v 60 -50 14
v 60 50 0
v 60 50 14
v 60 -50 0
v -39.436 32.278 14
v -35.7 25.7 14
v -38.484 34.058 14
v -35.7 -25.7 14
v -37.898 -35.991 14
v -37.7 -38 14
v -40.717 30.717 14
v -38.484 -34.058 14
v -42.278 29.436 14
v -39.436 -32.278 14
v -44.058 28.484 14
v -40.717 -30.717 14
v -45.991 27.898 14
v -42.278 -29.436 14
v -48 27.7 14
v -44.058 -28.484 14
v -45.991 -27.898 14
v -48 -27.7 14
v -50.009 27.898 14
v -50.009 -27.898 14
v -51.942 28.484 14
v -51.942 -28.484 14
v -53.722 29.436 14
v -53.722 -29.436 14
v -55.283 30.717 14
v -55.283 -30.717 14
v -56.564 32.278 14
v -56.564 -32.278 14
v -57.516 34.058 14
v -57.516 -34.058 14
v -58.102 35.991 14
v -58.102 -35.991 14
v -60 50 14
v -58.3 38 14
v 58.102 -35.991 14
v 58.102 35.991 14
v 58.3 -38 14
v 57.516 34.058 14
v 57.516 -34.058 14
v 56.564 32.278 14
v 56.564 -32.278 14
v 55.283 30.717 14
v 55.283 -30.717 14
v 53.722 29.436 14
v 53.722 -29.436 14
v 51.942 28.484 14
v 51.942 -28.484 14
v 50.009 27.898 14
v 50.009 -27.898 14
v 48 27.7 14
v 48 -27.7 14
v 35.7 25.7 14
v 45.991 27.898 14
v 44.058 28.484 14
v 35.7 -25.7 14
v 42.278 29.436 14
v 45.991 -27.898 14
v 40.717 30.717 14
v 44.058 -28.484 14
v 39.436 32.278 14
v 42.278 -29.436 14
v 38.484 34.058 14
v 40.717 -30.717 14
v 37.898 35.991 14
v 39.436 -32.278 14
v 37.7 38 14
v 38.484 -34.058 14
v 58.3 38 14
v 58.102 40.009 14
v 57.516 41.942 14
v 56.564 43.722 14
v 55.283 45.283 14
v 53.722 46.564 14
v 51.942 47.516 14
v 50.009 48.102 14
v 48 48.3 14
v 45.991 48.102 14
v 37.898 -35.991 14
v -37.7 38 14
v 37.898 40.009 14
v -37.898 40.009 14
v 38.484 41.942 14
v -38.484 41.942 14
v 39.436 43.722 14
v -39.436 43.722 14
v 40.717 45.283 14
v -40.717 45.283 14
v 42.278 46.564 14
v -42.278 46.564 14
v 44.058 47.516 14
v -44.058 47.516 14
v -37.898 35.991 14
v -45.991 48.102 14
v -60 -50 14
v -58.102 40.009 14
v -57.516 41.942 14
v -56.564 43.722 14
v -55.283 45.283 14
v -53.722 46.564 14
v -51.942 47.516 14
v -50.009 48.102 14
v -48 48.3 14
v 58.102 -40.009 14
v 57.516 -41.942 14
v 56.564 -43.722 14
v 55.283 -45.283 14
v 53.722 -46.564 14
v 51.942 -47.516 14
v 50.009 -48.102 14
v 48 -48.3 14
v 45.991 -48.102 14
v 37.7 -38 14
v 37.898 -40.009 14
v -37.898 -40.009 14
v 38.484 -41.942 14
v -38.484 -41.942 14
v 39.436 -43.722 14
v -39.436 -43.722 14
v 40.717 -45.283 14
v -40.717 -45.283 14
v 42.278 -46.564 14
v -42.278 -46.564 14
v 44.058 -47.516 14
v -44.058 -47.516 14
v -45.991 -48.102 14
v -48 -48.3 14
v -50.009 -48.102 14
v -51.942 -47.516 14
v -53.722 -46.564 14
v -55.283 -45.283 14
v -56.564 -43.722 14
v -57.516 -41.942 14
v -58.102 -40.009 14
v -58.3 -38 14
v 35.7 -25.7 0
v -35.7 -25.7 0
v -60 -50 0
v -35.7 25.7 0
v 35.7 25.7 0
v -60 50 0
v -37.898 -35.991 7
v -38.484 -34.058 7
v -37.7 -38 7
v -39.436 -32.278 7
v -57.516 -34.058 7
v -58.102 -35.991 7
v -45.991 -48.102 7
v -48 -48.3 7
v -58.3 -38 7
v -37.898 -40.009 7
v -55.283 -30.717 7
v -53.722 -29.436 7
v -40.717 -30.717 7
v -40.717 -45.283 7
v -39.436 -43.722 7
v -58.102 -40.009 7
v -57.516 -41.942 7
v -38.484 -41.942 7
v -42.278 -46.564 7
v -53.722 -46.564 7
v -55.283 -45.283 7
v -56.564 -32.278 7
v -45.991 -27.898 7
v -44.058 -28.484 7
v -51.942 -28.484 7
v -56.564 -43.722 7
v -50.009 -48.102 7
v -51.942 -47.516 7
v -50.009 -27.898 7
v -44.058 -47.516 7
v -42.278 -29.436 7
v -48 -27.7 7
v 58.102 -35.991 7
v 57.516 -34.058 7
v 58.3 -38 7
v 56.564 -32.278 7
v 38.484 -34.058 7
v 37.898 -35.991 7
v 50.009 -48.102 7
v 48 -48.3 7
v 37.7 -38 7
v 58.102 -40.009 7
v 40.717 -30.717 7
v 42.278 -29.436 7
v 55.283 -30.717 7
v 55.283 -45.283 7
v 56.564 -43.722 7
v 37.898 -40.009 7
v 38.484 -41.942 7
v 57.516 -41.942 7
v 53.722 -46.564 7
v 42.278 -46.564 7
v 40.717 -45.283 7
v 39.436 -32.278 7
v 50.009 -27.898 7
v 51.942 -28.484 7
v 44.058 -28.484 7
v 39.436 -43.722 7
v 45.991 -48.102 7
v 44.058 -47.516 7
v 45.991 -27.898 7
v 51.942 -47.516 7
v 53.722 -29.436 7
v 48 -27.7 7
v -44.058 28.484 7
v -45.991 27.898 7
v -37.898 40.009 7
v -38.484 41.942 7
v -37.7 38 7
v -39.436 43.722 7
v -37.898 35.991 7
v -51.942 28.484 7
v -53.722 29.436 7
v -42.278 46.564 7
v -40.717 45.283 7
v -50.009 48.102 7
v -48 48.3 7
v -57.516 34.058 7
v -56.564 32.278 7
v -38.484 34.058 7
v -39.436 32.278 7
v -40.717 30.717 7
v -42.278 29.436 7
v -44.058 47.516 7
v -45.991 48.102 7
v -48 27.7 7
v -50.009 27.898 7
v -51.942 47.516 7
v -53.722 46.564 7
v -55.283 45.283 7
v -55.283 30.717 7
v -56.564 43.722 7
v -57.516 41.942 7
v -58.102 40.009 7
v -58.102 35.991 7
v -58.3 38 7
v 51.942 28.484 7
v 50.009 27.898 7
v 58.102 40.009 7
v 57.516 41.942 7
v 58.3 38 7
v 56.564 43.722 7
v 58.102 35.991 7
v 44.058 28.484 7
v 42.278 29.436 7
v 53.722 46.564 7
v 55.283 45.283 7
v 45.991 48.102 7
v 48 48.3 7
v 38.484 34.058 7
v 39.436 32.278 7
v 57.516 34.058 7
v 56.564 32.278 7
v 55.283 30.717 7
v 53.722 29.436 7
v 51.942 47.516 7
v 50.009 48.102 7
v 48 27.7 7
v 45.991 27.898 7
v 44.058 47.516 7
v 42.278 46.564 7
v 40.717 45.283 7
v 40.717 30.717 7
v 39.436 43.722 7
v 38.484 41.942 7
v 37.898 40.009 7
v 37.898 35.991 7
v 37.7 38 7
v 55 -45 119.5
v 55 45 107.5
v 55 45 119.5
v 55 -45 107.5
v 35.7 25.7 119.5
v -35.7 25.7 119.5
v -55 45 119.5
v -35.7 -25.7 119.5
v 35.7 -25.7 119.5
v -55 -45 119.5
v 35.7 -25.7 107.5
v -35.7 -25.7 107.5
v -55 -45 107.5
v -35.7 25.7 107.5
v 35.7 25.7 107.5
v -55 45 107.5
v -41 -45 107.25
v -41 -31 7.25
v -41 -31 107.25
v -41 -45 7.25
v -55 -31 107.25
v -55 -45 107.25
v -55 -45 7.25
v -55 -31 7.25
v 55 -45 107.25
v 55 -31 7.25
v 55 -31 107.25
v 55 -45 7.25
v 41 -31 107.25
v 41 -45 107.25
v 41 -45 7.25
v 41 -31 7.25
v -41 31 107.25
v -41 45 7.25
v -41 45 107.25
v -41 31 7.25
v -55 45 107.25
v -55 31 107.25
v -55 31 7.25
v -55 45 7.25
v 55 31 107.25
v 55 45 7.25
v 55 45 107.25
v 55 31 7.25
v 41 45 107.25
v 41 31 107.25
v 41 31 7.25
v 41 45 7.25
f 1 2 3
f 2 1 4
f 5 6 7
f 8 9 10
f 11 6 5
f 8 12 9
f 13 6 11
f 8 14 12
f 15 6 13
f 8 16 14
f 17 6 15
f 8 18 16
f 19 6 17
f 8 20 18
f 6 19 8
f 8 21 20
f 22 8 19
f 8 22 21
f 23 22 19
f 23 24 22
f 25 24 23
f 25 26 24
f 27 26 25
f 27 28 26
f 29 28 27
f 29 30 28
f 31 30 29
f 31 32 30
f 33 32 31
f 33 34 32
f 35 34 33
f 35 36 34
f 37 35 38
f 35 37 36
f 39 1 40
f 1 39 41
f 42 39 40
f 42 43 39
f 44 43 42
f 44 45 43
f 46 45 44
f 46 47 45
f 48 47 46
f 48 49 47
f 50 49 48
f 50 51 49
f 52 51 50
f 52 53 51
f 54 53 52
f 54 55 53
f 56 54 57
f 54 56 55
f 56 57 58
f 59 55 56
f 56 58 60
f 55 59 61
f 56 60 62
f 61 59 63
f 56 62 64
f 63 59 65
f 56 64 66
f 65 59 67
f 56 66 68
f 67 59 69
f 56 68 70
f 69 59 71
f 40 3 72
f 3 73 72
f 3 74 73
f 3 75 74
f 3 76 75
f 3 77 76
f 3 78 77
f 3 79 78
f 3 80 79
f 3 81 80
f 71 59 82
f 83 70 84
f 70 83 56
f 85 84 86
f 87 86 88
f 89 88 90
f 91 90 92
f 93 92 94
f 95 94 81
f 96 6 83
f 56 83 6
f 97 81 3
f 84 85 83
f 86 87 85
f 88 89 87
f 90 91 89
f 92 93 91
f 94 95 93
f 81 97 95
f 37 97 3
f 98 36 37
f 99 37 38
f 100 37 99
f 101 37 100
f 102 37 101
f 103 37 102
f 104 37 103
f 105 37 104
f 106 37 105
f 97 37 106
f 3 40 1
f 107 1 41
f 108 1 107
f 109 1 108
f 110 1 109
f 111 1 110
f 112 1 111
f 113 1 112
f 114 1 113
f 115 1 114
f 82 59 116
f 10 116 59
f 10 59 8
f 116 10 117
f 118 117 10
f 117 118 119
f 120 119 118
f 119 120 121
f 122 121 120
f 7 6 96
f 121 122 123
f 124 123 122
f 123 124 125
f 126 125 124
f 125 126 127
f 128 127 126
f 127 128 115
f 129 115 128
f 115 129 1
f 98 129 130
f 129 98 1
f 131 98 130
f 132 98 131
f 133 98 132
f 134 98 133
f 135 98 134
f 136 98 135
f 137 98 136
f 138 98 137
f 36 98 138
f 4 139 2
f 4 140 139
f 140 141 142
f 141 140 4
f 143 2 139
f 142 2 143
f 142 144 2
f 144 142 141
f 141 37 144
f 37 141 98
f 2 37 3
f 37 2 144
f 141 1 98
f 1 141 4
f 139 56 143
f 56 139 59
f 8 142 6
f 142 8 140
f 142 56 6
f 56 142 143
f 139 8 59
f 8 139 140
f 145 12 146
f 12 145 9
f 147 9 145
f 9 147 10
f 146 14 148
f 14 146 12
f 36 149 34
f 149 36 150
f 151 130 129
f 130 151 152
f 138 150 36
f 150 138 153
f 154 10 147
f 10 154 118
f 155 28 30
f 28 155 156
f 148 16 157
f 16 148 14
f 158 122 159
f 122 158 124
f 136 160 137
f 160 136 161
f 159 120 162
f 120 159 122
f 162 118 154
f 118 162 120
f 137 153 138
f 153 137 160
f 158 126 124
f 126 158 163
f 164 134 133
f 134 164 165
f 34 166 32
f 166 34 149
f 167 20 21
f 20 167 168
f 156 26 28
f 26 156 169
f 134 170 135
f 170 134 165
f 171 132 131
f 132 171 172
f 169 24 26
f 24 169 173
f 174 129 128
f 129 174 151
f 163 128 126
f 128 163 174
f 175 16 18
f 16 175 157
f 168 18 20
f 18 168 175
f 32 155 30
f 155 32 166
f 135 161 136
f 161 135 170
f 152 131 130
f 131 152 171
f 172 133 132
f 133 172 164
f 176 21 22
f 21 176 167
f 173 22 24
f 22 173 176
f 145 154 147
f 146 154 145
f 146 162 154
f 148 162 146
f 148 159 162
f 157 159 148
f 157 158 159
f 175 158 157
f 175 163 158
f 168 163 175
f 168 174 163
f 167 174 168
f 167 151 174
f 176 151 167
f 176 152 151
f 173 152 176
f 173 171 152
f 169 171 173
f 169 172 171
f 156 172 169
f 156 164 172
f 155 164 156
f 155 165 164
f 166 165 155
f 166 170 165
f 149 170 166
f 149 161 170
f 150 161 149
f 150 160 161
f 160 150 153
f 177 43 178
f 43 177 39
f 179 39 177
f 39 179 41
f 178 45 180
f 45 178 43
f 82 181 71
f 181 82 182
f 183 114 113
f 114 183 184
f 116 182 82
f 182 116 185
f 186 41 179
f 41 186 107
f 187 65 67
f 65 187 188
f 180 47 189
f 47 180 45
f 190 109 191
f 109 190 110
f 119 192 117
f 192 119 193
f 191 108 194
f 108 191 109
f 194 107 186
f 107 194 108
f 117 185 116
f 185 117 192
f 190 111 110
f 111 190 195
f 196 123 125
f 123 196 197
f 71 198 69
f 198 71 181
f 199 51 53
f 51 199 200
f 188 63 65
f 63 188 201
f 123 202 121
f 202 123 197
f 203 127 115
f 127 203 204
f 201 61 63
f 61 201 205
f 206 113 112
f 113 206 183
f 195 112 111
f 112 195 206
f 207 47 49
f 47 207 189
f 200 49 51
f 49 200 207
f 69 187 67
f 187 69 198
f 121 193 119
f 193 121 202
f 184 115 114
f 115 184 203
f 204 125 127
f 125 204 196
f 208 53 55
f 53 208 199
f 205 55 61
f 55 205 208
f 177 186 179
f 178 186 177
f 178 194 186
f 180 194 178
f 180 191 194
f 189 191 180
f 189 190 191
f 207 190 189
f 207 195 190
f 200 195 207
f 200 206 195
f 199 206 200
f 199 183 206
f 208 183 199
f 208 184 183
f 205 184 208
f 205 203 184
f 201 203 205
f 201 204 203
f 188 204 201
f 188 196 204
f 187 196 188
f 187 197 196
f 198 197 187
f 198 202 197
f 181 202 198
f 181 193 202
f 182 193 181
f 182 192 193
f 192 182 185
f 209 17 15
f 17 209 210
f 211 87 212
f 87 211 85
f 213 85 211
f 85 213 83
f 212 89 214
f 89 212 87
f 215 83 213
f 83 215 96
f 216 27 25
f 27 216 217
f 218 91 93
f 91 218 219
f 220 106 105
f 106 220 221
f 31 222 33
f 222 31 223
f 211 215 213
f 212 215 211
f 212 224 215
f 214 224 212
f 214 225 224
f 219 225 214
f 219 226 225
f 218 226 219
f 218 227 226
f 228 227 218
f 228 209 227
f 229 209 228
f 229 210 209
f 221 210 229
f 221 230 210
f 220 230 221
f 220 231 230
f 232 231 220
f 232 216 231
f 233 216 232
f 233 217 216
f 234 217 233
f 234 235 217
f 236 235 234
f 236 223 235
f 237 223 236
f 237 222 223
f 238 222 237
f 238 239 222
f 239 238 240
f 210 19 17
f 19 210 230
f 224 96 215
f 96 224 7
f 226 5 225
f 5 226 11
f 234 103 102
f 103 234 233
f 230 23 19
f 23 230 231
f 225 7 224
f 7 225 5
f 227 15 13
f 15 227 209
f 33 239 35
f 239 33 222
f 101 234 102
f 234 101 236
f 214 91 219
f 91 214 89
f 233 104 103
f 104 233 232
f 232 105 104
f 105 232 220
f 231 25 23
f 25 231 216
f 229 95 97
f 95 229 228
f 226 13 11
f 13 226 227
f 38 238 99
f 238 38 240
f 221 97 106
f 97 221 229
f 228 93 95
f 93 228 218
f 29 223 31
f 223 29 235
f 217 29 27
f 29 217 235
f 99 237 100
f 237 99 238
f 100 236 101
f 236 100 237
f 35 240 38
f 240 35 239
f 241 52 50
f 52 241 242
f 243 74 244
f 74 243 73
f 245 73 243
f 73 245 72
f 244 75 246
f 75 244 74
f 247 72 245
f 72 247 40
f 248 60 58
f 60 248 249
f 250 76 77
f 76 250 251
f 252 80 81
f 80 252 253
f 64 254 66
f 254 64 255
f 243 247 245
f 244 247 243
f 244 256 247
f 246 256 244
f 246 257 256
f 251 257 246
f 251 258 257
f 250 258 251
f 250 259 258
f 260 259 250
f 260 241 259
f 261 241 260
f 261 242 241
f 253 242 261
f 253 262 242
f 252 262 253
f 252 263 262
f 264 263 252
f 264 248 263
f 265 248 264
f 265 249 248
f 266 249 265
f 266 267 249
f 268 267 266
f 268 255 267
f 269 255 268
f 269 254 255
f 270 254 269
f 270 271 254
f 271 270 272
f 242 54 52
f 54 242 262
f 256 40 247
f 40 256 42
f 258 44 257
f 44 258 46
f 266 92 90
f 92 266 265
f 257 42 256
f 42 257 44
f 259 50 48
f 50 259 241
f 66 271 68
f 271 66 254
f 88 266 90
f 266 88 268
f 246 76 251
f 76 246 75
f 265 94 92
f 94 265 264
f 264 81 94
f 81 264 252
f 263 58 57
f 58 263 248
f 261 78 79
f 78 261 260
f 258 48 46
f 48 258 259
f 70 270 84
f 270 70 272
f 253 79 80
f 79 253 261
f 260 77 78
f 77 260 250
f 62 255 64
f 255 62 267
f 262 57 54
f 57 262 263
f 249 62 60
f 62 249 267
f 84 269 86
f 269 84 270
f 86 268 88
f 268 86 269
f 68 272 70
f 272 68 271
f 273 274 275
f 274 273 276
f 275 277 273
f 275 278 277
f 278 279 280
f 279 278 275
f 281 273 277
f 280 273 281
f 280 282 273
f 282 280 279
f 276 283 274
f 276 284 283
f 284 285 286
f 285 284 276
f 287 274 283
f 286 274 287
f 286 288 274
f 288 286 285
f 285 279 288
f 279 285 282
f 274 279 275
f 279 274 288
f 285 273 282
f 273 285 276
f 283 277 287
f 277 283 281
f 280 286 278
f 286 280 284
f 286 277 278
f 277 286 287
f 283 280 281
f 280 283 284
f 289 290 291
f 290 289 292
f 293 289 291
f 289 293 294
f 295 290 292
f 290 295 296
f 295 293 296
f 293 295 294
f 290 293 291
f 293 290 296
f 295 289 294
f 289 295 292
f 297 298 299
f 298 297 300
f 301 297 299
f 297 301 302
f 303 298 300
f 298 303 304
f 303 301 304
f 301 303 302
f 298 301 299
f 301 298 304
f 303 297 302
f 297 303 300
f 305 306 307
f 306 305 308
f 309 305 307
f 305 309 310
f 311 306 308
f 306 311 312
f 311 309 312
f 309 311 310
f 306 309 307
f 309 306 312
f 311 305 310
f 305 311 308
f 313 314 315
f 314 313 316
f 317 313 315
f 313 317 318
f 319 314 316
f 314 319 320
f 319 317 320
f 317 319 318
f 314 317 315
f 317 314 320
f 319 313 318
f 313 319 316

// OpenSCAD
$fn = 32;

// ------------------------------------------------------------------------
// Frame cube: base 120 x 100 mm, posts 100 mm tall
// Every part is its own module, assembly() places every instance.
// ------------------------------------------------------------------------

// --- part 1 ---
module base_frame() {
  difference() {
    translate([-60, -50, 0]) cube([120, 100, 14]);
    translate([-35.7, -25.7, -1]) cube([71.4, 51.4, 16]);
    translate([-48, -38, 7]) cylinder(h = 8, d = 20.6);
    translate([48, -38, 7]) cylinder(h = 8, d = 20.6);
    translate([-48, 38, 7]) cylinder(h = 8, d = 20.6);
    translate([48, 38, 7]) cylinder(h = 8, d = 20.6);
  }
}

// --- part 2 ---
module corner_post() {
  translate([-7, -7, 0]) cube([14, 14, 100]);
}

// --- part 3 ---
module top_frame() {
  difference() {
    translate([-55, -45, 0]) cube([110, 90, 12]);
    translate([-35.7, -25.7, -1]) cube([71.4, 51.4, 14]);
  }
}

// --- assembly ---
module assembly() {
  color([0.80, 0.24, 0.20]) translate([0, 0, 0]) rotate([0, 0, 0]) base_frame();
  color([0.20, 0.45, 0.75]) translate([-48, -38, 7.25]) rotate([0, 0, 0]) corner_post();
  color([0.25, 0.62, 0.32]) translate([48, -38, 7.25]) rotate([0, 0, 0]) corner_post();
  color([0.92, 0.70, 0.18]) translate([-48, 38, 7.25]) rotate([0, 0, 0]) corner_post();
  color([0.58, 0.35, 0.70]) translate([48, 38, 7.25]) rotate([0, 0, 0]) corner_post();
  color([0.16, 0.66, 0.66]) translate([0, 0, 107.5]) rotate([0, 0, 0]) top_frame();
}

assembly();
